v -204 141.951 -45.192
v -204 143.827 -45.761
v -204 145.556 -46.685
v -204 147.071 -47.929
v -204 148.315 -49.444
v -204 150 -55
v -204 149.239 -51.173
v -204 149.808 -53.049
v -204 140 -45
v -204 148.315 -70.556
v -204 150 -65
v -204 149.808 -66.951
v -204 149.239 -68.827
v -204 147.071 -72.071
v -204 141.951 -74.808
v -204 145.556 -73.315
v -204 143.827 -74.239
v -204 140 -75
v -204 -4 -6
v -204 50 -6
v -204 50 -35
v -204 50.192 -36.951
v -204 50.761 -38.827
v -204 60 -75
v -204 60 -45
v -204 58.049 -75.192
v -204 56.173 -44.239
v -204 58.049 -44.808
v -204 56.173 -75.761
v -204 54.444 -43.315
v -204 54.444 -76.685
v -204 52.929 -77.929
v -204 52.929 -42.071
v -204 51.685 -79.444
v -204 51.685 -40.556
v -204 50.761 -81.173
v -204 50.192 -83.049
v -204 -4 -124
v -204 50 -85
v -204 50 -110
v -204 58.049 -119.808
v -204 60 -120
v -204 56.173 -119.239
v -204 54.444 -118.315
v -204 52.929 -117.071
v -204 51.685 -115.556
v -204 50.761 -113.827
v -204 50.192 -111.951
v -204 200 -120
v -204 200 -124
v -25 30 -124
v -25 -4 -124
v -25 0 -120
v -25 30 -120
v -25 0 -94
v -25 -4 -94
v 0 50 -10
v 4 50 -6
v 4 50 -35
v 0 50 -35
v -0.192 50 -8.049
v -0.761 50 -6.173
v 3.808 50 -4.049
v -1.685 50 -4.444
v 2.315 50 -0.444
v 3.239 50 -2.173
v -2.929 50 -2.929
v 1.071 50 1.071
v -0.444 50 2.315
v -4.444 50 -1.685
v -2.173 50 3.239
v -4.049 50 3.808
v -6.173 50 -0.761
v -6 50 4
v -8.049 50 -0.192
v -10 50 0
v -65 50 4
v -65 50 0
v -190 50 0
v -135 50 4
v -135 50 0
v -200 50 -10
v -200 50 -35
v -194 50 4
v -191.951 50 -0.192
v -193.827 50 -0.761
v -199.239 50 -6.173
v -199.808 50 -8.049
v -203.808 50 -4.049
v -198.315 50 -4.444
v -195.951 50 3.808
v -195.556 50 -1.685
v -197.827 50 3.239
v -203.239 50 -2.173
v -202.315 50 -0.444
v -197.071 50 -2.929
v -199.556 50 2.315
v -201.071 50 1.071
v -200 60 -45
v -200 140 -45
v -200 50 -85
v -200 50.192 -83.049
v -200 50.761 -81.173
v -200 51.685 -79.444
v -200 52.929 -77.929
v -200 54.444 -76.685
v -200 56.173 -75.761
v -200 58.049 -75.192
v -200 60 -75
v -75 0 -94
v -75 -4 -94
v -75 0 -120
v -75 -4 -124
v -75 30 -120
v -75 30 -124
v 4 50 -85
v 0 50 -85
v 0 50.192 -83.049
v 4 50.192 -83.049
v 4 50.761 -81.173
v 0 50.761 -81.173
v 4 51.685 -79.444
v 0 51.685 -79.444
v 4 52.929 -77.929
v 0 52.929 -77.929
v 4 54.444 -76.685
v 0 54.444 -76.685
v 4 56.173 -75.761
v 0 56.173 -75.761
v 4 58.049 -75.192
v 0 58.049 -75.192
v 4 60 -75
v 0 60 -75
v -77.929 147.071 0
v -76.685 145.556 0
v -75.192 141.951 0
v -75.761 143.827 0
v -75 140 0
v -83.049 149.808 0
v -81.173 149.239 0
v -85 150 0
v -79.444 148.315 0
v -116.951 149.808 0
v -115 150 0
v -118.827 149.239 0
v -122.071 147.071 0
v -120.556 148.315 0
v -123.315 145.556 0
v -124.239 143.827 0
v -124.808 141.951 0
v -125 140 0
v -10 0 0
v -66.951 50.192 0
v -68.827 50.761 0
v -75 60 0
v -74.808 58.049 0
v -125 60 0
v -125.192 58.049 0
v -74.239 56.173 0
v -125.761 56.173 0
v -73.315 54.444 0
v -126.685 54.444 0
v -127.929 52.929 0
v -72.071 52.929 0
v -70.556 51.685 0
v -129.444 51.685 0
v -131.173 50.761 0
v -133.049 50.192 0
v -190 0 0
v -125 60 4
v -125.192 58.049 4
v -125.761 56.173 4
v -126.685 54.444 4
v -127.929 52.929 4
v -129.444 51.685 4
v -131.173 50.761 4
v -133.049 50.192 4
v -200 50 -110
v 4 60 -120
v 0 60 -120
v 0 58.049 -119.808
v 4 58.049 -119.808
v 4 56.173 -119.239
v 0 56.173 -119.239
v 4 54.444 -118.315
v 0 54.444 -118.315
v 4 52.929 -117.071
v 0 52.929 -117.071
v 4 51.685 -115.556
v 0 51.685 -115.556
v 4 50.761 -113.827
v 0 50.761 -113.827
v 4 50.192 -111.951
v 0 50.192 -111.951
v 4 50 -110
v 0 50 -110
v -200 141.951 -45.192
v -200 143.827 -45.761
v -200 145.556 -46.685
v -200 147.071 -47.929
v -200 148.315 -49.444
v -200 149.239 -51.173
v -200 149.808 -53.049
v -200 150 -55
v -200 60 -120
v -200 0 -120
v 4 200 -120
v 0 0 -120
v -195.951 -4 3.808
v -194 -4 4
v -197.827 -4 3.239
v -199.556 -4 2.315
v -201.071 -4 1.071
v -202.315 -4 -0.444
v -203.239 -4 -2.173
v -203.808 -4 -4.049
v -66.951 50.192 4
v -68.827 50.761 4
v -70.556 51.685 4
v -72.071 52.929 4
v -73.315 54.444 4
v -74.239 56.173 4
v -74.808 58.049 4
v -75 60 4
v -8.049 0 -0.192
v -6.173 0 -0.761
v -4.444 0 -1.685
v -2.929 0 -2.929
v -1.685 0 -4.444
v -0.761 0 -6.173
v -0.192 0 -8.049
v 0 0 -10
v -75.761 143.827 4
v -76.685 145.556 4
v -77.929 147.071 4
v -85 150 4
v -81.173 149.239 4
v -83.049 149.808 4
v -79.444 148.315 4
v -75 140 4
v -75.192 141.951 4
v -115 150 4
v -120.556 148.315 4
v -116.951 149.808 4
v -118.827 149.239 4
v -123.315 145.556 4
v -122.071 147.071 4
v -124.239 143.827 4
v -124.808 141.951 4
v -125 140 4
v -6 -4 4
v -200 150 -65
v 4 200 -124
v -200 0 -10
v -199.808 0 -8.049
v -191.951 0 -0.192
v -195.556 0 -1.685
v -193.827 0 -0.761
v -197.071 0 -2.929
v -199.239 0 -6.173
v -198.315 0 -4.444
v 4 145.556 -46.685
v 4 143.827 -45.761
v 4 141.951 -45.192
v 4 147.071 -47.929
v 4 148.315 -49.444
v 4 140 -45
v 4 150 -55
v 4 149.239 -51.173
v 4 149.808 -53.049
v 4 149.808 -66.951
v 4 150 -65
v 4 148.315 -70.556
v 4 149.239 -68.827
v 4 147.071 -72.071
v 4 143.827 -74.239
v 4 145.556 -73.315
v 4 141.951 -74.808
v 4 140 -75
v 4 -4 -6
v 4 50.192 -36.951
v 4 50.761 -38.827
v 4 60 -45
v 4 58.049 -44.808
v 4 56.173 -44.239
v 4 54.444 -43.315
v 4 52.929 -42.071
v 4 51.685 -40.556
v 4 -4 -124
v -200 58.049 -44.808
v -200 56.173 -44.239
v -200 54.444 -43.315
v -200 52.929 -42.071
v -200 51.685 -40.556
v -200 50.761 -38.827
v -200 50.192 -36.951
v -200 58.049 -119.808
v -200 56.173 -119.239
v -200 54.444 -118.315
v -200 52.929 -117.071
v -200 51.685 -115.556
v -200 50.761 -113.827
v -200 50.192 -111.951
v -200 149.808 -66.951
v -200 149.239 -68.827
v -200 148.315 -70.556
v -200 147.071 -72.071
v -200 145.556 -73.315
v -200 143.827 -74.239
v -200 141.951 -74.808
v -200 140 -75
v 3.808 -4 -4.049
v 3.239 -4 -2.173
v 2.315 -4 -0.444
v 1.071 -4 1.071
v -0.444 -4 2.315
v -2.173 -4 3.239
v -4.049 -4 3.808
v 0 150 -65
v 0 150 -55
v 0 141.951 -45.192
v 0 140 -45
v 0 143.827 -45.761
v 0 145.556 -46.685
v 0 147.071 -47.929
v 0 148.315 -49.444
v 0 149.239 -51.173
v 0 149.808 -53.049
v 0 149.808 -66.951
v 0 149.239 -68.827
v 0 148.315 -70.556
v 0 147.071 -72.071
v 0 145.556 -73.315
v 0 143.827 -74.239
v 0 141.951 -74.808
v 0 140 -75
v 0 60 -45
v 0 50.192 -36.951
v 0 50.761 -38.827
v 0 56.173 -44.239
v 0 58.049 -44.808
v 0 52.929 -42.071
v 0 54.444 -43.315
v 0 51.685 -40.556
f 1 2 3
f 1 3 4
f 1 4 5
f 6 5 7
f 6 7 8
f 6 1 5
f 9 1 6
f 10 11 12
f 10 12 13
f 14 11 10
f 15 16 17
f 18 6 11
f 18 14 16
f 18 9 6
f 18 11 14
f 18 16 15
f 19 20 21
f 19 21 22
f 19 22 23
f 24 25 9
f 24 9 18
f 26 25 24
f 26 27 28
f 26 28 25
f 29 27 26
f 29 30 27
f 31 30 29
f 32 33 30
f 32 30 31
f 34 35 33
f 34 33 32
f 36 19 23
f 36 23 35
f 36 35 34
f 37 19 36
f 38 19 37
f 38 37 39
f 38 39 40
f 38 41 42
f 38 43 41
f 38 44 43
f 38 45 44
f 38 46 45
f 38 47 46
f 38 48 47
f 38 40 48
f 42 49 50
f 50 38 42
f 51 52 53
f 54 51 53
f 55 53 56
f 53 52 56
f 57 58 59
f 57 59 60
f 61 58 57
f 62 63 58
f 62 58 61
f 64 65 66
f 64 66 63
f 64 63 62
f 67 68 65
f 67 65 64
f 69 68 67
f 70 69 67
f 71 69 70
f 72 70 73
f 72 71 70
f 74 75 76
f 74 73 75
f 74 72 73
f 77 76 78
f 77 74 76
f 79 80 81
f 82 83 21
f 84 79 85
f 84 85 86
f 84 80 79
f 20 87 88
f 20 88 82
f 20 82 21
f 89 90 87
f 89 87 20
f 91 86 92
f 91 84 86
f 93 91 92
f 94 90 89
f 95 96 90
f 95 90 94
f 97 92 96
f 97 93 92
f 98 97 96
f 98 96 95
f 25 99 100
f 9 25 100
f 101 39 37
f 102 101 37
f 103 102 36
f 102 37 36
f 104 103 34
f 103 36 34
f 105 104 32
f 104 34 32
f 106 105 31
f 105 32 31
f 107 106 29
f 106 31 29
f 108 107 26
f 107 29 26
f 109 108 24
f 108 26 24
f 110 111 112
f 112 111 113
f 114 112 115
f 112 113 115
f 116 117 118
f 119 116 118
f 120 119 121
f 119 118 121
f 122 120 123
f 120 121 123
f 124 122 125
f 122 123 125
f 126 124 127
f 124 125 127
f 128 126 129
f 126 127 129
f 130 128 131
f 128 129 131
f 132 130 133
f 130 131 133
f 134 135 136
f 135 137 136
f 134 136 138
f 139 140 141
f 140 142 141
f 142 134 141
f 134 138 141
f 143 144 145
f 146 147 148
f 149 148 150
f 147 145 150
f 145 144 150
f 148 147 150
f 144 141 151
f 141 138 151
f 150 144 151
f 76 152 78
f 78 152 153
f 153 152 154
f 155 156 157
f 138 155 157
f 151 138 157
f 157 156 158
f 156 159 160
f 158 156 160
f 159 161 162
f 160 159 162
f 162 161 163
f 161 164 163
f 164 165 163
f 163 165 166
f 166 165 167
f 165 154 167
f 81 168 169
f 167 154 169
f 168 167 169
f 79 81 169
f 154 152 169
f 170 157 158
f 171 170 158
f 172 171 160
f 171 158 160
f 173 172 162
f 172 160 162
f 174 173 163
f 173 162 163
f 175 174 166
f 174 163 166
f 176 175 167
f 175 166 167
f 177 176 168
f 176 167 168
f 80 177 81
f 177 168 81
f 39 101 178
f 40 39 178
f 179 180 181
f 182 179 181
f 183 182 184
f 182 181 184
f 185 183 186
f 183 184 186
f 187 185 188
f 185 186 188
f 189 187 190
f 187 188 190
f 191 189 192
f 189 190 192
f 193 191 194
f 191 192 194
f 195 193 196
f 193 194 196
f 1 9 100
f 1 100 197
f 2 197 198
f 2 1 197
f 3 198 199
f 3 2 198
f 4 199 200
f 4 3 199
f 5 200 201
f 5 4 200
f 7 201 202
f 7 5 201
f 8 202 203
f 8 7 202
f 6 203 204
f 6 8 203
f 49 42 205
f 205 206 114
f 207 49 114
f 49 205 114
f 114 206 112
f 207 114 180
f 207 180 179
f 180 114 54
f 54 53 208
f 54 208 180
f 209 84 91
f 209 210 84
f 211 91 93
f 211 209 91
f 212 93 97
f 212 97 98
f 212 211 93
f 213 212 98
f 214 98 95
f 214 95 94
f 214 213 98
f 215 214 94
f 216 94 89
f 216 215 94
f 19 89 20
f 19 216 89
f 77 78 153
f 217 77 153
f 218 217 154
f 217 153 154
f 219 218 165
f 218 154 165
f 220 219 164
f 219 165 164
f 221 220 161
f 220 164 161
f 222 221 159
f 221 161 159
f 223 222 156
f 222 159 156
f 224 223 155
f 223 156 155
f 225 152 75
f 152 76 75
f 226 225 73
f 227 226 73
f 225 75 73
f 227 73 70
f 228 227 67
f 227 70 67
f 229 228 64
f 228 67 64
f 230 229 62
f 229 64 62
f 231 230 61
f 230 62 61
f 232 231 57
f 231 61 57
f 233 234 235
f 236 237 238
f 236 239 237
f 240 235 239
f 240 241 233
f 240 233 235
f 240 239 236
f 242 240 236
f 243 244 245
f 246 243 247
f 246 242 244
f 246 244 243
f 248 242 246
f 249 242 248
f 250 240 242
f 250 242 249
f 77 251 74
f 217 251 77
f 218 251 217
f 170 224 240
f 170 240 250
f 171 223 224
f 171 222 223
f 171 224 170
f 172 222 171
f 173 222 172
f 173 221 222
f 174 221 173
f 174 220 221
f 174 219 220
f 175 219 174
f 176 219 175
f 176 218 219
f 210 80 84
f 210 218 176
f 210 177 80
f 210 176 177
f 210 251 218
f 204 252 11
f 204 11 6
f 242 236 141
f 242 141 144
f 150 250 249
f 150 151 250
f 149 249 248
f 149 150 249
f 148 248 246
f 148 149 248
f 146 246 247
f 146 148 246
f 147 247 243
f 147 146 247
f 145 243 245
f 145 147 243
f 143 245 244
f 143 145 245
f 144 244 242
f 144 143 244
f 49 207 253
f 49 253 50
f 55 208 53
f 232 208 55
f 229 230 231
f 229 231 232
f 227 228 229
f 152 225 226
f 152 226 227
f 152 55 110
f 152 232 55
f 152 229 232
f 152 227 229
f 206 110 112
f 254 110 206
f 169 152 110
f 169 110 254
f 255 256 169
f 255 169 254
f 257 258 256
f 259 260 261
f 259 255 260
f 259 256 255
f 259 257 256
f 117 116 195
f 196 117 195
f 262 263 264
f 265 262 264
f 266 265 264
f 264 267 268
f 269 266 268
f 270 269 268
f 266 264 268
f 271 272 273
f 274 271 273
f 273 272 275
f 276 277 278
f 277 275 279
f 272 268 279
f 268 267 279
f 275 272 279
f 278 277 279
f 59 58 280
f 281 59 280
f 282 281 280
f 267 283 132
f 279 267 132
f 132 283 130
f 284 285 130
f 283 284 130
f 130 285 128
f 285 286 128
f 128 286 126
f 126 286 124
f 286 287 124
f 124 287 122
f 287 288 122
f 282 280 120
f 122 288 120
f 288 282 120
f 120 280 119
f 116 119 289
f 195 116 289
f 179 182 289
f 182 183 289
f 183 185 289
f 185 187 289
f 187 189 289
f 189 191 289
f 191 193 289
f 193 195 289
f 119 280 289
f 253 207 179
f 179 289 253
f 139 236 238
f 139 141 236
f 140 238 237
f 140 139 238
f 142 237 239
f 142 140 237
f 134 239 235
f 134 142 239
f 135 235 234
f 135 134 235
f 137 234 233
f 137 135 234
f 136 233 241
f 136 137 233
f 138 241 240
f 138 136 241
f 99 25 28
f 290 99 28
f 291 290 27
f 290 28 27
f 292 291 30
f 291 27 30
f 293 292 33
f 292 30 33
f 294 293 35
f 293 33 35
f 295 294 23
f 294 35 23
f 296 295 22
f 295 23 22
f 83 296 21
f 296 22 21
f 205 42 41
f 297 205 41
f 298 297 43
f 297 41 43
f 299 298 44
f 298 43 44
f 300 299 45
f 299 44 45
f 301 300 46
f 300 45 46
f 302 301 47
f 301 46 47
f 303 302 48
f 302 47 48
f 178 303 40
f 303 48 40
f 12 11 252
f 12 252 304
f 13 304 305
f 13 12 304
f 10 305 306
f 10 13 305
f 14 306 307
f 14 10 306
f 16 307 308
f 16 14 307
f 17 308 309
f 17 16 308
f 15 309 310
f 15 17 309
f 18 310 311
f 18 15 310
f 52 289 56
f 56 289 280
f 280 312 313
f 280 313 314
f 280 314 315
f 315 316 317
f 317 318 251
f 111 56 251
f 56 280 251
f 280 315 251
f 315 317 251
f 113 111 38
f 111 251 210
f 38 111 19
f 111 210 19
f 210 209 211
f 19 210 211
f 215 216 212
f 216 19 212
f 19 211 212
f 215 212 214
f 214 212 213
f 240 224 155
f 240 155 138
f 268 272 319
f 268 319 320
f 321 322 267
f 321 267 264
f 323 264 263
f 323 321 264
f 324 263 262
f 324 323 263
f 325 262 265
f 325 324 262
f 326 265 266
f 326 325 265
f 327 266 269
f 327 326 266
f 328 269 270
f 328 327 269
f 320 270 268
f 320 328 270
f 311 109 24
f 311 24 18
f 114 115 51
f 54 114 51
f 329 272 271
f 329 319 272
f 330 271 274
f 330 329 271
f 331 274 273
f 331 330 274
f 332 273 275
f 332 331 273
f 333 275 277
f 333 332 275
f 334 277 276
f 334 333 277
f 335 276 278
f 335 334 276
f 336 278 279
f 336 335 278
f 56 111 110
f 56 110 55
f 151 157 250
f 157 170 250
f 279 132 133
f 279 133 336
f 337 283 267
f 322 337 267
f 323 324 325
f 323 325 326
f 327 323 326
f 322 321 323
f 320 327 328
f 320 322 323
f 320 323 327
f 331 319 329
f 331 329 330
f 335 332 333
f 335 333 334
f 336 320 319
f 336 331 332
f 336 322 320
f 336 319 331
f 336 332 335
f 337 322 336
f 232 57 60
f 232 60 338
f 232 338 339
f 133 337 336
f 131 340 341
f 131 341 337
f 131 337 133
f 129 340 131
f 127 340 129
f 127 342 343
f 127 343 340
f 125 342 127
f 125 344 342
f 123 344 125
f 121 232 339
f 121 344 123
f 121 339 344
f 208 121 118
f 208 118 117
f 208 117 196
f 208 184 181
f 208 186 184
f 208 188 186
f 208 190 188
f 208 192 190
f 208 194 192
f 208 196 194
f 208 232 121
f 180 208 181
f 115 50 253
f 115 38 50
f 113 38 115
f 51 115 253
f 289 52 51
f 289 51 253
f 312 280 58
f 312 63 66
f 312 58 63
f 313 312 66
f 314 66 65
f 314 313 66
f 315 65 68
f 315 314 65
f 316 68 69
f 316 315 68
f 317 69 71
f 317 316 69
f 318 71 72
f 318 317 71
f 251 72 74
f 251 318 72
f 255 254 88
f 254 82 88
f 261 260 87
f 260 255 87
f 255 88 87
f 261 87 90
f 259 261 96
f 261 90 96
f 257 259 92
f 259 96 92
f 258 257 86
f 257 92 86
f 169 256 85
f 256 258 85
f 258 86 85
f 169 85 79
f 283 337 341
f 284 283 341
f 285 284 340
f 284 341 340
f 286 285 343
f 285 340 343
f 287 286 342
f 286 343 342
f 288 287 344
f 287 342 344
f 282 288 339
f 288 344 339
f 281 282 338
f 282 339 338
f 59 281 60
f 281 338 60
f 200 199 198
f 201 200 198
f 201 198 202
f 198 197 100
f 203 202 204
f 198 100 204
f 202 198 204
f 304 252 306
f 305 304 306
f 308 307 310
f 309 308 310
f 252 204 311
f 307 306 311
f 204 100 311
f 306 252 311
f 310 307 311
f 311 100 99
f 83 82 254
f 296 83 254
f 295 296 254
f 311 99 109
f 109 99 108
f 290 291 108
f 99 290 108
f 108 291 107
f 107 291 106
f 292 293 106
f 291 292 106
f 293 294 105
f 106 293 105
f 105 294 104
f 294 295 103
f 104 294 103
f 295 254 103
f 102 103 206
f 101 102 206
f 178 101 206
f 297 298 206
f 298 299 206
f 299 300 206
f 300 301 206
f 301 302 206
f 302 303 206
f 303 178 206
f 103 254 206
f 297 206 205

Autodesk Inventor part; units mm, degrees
ref_plane "YZ Plane" through (0, 0, 0) normal (1, 0, 0) x (0, 1, 0)
ref_plane "XZ Plane" through (0, 0, 0) normal (0, 1, 0) x (-1, 0, 0)
ref_plane "XY Plane" through (0, 0, 0) normal (0, 0, 1) x (1, 0, 0)
sketch "Sketch1" plane through (0, 0, 0) normal (0, 1, 0) x (-1, 0, 0)
  line L0 (0, 0) -> (0, -120)
  line L1 (0, 0) -> (200, 0)
  line L2 (200, 0) -> (200, -120)
  line L3 (200, -120) -> (0, -120)
  dimension "d0" = 120
  dimension "d1" = 200
extrude "Extrusion1" add sketch "Sketch1" along normal blind 200
shell "Shell1" thickness 4 outward yes removed faces 1 at (-66.6667, 200, -40)
sketch "Sketch2" plane through (4, -4, 4) normal (1, 0, 0) x (0, 0, -1)
  line L0 (0, 0) -> (0, 204) projected
  line L1 (0, 0) -> (0, 204)
  line L2 (4, 4) -> (4, 104)
  line L3 (4, 4) -> (4, 204) projected
  line L4 (4, 54) -> (124, 54)
  line L5 (124, 4) -> (124, 204) projected
  line L6 (64, 54) -> (4, 54)
  line L7 (124, 54) -> (64, 54)
  line L8 (94, 54) -> (34, 54)
  line L9 (34, 54) -> (64, 54)
  line L10 (64, 54) -> (94, 54)
  line L11 (79, 54) -> (49, 54)
  line L12 (124, 104) -> (124, 204)
  line L13 (79, 154) -> (49, 154)
  line L14 (79, 54) -> (79, 154)
  line L15 (49, 54) -> (49, 154)
  line L16 (4, 54) -> (4, 204)
  line L17 (4, 204) -> (124, 204)
  line L18 (0, 204) -> (128, 204) projected
  line L19 (124, 204) -> (124, 54)
extrude "Extrusion2" cut sketch "Sketch2" against normal through all contours L2 L3 L17 L5 L4 L14 L13 L15
sketch "Sketch3" plane through (-204, -4, 4) normal (0, 0, 1) x (1, 0, 0)
  line L0 (204, 54) -> (204, 154) projected
  line L1 (4, 4) -> (4, 54) projected
  line L2 (204, 54) -> (4, 54)
  line L3 (4, 54) -> (104, 54)
  line L4 (104, 54) -> (4, 54)
  line L5 (104, 54) -> (54, 54)
  line L6 (208, 54) -> (204, 54) projected
  line L7 (104, 54) -> (204, 54)
  line L8 (204, 54) -> (154, 54)
  line L9 (154, 54) -> (104, 54)
  line L10 (104, 54) -> (54, 54)
  line L11 (79, 54) -> (129, 54)
  line L12 (129, 154) -> (79, 154)
  line L13 (129, 54) -> (129, 154)
  line L14 (79, 54) -> (79, 154)
  line L15 (4, 54) -> (4, 204)
  line L16 (208, 204) -> (0, 204) projected
  line L17 (204, 54) -> (204, 204)
  line L18 (4, 54) -> (0, 54)
  line L19 (0, 0) -> (0, 204) projected
  line L20 (0, 204) -> (0, 54)
  line L21 (0, 204) -> (208, 204)
  line L22 (208, 154) -> (208, 54) projected
  line L23 (208, 0) -> (208, 204) projected
  line L24 (208, 54) -> (208, 204)
  line L25 (204, 54) -> (208, 54)
  point P0 (204, 4)
extrude "Extrusion3" cut sketch "Sketch3" against normal blind 10 contours L2 L13 L12 L14 L15 L16 L17 L0 | L0 L17 L16 L23 L22 L6 | L15 L18 L19 L16
sketch "Sketch4" plane through (0, 200, 0) normal (0, 1, 0) x (1, 0, 0)
  point P0 (0, 0)
fillet "Fillet1" radius 10 18 edges at (2, 50, -45) (2, 50, -75) (2, 50, -120) (-202, 50, -120) (-75, 50, 2) (-125, 50, 2) (-202, 50, -45) (-202, 50, -75) (2, 150, -45) (2, 150, -75) (-75, 150, 2) (-125, 150, 2) (-202, 150, -45) (-202, 150, -75) (0, 25, 0) (-200, 25, 0) (-204, 23, 4) (4, 23, 4)
sketch "Sketch5" plane through (4, -4, -124) normal (0, 0, -1) x (-1, 0, 0)
  line L0 (194, 4) -> (4, 4) projected
  line L1 (204, 4) -> (104, 4)
  line L2 (79, 4) -> (104, 4)
  line L3 (29, 4) -> (4, 4)
  line L4 (79, 4) -> (29, 4)
  line L5 (29, 4) -> (29, 34)
  line L6 (79, 4) -> (79, 34)
  line L7 (79, 34) -> (29, 34)
  line L8 (29, 4) -> (29, 0)
  line L9 (198, 0) -> (10, 0) projected
  line L10 (29, 0) -> (79, 0)
  line L11 (79, 0) -> (79, 4)
  line L12 (4, 4) -> (29, 4)
  line L13 (79, 4) -> (204, 4)
  line L14 (4, 4) -> (29, 4)
  line L15 (79, 4) -> (104, 4)
  dimension "d10" = 30
extrude "Extrusion4" cut sketch "Sketch5" against normal blind 10
sketch "Sketch6" plane through (0, -4, 0) normal (0, -1, 0) x (1, 0, 0)
  line L0 (-25, -114) -> (-25, -124) projected
  line L1 (-25, -124) -> (-25, -94)
  line L2 (-75, -124) -> (-75, -94)
  line L3 (-75, -94) -> (-25, -94)
  line L4 (-25, -124) -> (-75, -124) projected
  line L5 (-25, -124) -> (-75, -124)
  point P0 (0, 0)
  dimension "d13" = 30
extrude "Extrusion5" cut sketch "Sketch6" against normal blind 10
properties part number "bag"
